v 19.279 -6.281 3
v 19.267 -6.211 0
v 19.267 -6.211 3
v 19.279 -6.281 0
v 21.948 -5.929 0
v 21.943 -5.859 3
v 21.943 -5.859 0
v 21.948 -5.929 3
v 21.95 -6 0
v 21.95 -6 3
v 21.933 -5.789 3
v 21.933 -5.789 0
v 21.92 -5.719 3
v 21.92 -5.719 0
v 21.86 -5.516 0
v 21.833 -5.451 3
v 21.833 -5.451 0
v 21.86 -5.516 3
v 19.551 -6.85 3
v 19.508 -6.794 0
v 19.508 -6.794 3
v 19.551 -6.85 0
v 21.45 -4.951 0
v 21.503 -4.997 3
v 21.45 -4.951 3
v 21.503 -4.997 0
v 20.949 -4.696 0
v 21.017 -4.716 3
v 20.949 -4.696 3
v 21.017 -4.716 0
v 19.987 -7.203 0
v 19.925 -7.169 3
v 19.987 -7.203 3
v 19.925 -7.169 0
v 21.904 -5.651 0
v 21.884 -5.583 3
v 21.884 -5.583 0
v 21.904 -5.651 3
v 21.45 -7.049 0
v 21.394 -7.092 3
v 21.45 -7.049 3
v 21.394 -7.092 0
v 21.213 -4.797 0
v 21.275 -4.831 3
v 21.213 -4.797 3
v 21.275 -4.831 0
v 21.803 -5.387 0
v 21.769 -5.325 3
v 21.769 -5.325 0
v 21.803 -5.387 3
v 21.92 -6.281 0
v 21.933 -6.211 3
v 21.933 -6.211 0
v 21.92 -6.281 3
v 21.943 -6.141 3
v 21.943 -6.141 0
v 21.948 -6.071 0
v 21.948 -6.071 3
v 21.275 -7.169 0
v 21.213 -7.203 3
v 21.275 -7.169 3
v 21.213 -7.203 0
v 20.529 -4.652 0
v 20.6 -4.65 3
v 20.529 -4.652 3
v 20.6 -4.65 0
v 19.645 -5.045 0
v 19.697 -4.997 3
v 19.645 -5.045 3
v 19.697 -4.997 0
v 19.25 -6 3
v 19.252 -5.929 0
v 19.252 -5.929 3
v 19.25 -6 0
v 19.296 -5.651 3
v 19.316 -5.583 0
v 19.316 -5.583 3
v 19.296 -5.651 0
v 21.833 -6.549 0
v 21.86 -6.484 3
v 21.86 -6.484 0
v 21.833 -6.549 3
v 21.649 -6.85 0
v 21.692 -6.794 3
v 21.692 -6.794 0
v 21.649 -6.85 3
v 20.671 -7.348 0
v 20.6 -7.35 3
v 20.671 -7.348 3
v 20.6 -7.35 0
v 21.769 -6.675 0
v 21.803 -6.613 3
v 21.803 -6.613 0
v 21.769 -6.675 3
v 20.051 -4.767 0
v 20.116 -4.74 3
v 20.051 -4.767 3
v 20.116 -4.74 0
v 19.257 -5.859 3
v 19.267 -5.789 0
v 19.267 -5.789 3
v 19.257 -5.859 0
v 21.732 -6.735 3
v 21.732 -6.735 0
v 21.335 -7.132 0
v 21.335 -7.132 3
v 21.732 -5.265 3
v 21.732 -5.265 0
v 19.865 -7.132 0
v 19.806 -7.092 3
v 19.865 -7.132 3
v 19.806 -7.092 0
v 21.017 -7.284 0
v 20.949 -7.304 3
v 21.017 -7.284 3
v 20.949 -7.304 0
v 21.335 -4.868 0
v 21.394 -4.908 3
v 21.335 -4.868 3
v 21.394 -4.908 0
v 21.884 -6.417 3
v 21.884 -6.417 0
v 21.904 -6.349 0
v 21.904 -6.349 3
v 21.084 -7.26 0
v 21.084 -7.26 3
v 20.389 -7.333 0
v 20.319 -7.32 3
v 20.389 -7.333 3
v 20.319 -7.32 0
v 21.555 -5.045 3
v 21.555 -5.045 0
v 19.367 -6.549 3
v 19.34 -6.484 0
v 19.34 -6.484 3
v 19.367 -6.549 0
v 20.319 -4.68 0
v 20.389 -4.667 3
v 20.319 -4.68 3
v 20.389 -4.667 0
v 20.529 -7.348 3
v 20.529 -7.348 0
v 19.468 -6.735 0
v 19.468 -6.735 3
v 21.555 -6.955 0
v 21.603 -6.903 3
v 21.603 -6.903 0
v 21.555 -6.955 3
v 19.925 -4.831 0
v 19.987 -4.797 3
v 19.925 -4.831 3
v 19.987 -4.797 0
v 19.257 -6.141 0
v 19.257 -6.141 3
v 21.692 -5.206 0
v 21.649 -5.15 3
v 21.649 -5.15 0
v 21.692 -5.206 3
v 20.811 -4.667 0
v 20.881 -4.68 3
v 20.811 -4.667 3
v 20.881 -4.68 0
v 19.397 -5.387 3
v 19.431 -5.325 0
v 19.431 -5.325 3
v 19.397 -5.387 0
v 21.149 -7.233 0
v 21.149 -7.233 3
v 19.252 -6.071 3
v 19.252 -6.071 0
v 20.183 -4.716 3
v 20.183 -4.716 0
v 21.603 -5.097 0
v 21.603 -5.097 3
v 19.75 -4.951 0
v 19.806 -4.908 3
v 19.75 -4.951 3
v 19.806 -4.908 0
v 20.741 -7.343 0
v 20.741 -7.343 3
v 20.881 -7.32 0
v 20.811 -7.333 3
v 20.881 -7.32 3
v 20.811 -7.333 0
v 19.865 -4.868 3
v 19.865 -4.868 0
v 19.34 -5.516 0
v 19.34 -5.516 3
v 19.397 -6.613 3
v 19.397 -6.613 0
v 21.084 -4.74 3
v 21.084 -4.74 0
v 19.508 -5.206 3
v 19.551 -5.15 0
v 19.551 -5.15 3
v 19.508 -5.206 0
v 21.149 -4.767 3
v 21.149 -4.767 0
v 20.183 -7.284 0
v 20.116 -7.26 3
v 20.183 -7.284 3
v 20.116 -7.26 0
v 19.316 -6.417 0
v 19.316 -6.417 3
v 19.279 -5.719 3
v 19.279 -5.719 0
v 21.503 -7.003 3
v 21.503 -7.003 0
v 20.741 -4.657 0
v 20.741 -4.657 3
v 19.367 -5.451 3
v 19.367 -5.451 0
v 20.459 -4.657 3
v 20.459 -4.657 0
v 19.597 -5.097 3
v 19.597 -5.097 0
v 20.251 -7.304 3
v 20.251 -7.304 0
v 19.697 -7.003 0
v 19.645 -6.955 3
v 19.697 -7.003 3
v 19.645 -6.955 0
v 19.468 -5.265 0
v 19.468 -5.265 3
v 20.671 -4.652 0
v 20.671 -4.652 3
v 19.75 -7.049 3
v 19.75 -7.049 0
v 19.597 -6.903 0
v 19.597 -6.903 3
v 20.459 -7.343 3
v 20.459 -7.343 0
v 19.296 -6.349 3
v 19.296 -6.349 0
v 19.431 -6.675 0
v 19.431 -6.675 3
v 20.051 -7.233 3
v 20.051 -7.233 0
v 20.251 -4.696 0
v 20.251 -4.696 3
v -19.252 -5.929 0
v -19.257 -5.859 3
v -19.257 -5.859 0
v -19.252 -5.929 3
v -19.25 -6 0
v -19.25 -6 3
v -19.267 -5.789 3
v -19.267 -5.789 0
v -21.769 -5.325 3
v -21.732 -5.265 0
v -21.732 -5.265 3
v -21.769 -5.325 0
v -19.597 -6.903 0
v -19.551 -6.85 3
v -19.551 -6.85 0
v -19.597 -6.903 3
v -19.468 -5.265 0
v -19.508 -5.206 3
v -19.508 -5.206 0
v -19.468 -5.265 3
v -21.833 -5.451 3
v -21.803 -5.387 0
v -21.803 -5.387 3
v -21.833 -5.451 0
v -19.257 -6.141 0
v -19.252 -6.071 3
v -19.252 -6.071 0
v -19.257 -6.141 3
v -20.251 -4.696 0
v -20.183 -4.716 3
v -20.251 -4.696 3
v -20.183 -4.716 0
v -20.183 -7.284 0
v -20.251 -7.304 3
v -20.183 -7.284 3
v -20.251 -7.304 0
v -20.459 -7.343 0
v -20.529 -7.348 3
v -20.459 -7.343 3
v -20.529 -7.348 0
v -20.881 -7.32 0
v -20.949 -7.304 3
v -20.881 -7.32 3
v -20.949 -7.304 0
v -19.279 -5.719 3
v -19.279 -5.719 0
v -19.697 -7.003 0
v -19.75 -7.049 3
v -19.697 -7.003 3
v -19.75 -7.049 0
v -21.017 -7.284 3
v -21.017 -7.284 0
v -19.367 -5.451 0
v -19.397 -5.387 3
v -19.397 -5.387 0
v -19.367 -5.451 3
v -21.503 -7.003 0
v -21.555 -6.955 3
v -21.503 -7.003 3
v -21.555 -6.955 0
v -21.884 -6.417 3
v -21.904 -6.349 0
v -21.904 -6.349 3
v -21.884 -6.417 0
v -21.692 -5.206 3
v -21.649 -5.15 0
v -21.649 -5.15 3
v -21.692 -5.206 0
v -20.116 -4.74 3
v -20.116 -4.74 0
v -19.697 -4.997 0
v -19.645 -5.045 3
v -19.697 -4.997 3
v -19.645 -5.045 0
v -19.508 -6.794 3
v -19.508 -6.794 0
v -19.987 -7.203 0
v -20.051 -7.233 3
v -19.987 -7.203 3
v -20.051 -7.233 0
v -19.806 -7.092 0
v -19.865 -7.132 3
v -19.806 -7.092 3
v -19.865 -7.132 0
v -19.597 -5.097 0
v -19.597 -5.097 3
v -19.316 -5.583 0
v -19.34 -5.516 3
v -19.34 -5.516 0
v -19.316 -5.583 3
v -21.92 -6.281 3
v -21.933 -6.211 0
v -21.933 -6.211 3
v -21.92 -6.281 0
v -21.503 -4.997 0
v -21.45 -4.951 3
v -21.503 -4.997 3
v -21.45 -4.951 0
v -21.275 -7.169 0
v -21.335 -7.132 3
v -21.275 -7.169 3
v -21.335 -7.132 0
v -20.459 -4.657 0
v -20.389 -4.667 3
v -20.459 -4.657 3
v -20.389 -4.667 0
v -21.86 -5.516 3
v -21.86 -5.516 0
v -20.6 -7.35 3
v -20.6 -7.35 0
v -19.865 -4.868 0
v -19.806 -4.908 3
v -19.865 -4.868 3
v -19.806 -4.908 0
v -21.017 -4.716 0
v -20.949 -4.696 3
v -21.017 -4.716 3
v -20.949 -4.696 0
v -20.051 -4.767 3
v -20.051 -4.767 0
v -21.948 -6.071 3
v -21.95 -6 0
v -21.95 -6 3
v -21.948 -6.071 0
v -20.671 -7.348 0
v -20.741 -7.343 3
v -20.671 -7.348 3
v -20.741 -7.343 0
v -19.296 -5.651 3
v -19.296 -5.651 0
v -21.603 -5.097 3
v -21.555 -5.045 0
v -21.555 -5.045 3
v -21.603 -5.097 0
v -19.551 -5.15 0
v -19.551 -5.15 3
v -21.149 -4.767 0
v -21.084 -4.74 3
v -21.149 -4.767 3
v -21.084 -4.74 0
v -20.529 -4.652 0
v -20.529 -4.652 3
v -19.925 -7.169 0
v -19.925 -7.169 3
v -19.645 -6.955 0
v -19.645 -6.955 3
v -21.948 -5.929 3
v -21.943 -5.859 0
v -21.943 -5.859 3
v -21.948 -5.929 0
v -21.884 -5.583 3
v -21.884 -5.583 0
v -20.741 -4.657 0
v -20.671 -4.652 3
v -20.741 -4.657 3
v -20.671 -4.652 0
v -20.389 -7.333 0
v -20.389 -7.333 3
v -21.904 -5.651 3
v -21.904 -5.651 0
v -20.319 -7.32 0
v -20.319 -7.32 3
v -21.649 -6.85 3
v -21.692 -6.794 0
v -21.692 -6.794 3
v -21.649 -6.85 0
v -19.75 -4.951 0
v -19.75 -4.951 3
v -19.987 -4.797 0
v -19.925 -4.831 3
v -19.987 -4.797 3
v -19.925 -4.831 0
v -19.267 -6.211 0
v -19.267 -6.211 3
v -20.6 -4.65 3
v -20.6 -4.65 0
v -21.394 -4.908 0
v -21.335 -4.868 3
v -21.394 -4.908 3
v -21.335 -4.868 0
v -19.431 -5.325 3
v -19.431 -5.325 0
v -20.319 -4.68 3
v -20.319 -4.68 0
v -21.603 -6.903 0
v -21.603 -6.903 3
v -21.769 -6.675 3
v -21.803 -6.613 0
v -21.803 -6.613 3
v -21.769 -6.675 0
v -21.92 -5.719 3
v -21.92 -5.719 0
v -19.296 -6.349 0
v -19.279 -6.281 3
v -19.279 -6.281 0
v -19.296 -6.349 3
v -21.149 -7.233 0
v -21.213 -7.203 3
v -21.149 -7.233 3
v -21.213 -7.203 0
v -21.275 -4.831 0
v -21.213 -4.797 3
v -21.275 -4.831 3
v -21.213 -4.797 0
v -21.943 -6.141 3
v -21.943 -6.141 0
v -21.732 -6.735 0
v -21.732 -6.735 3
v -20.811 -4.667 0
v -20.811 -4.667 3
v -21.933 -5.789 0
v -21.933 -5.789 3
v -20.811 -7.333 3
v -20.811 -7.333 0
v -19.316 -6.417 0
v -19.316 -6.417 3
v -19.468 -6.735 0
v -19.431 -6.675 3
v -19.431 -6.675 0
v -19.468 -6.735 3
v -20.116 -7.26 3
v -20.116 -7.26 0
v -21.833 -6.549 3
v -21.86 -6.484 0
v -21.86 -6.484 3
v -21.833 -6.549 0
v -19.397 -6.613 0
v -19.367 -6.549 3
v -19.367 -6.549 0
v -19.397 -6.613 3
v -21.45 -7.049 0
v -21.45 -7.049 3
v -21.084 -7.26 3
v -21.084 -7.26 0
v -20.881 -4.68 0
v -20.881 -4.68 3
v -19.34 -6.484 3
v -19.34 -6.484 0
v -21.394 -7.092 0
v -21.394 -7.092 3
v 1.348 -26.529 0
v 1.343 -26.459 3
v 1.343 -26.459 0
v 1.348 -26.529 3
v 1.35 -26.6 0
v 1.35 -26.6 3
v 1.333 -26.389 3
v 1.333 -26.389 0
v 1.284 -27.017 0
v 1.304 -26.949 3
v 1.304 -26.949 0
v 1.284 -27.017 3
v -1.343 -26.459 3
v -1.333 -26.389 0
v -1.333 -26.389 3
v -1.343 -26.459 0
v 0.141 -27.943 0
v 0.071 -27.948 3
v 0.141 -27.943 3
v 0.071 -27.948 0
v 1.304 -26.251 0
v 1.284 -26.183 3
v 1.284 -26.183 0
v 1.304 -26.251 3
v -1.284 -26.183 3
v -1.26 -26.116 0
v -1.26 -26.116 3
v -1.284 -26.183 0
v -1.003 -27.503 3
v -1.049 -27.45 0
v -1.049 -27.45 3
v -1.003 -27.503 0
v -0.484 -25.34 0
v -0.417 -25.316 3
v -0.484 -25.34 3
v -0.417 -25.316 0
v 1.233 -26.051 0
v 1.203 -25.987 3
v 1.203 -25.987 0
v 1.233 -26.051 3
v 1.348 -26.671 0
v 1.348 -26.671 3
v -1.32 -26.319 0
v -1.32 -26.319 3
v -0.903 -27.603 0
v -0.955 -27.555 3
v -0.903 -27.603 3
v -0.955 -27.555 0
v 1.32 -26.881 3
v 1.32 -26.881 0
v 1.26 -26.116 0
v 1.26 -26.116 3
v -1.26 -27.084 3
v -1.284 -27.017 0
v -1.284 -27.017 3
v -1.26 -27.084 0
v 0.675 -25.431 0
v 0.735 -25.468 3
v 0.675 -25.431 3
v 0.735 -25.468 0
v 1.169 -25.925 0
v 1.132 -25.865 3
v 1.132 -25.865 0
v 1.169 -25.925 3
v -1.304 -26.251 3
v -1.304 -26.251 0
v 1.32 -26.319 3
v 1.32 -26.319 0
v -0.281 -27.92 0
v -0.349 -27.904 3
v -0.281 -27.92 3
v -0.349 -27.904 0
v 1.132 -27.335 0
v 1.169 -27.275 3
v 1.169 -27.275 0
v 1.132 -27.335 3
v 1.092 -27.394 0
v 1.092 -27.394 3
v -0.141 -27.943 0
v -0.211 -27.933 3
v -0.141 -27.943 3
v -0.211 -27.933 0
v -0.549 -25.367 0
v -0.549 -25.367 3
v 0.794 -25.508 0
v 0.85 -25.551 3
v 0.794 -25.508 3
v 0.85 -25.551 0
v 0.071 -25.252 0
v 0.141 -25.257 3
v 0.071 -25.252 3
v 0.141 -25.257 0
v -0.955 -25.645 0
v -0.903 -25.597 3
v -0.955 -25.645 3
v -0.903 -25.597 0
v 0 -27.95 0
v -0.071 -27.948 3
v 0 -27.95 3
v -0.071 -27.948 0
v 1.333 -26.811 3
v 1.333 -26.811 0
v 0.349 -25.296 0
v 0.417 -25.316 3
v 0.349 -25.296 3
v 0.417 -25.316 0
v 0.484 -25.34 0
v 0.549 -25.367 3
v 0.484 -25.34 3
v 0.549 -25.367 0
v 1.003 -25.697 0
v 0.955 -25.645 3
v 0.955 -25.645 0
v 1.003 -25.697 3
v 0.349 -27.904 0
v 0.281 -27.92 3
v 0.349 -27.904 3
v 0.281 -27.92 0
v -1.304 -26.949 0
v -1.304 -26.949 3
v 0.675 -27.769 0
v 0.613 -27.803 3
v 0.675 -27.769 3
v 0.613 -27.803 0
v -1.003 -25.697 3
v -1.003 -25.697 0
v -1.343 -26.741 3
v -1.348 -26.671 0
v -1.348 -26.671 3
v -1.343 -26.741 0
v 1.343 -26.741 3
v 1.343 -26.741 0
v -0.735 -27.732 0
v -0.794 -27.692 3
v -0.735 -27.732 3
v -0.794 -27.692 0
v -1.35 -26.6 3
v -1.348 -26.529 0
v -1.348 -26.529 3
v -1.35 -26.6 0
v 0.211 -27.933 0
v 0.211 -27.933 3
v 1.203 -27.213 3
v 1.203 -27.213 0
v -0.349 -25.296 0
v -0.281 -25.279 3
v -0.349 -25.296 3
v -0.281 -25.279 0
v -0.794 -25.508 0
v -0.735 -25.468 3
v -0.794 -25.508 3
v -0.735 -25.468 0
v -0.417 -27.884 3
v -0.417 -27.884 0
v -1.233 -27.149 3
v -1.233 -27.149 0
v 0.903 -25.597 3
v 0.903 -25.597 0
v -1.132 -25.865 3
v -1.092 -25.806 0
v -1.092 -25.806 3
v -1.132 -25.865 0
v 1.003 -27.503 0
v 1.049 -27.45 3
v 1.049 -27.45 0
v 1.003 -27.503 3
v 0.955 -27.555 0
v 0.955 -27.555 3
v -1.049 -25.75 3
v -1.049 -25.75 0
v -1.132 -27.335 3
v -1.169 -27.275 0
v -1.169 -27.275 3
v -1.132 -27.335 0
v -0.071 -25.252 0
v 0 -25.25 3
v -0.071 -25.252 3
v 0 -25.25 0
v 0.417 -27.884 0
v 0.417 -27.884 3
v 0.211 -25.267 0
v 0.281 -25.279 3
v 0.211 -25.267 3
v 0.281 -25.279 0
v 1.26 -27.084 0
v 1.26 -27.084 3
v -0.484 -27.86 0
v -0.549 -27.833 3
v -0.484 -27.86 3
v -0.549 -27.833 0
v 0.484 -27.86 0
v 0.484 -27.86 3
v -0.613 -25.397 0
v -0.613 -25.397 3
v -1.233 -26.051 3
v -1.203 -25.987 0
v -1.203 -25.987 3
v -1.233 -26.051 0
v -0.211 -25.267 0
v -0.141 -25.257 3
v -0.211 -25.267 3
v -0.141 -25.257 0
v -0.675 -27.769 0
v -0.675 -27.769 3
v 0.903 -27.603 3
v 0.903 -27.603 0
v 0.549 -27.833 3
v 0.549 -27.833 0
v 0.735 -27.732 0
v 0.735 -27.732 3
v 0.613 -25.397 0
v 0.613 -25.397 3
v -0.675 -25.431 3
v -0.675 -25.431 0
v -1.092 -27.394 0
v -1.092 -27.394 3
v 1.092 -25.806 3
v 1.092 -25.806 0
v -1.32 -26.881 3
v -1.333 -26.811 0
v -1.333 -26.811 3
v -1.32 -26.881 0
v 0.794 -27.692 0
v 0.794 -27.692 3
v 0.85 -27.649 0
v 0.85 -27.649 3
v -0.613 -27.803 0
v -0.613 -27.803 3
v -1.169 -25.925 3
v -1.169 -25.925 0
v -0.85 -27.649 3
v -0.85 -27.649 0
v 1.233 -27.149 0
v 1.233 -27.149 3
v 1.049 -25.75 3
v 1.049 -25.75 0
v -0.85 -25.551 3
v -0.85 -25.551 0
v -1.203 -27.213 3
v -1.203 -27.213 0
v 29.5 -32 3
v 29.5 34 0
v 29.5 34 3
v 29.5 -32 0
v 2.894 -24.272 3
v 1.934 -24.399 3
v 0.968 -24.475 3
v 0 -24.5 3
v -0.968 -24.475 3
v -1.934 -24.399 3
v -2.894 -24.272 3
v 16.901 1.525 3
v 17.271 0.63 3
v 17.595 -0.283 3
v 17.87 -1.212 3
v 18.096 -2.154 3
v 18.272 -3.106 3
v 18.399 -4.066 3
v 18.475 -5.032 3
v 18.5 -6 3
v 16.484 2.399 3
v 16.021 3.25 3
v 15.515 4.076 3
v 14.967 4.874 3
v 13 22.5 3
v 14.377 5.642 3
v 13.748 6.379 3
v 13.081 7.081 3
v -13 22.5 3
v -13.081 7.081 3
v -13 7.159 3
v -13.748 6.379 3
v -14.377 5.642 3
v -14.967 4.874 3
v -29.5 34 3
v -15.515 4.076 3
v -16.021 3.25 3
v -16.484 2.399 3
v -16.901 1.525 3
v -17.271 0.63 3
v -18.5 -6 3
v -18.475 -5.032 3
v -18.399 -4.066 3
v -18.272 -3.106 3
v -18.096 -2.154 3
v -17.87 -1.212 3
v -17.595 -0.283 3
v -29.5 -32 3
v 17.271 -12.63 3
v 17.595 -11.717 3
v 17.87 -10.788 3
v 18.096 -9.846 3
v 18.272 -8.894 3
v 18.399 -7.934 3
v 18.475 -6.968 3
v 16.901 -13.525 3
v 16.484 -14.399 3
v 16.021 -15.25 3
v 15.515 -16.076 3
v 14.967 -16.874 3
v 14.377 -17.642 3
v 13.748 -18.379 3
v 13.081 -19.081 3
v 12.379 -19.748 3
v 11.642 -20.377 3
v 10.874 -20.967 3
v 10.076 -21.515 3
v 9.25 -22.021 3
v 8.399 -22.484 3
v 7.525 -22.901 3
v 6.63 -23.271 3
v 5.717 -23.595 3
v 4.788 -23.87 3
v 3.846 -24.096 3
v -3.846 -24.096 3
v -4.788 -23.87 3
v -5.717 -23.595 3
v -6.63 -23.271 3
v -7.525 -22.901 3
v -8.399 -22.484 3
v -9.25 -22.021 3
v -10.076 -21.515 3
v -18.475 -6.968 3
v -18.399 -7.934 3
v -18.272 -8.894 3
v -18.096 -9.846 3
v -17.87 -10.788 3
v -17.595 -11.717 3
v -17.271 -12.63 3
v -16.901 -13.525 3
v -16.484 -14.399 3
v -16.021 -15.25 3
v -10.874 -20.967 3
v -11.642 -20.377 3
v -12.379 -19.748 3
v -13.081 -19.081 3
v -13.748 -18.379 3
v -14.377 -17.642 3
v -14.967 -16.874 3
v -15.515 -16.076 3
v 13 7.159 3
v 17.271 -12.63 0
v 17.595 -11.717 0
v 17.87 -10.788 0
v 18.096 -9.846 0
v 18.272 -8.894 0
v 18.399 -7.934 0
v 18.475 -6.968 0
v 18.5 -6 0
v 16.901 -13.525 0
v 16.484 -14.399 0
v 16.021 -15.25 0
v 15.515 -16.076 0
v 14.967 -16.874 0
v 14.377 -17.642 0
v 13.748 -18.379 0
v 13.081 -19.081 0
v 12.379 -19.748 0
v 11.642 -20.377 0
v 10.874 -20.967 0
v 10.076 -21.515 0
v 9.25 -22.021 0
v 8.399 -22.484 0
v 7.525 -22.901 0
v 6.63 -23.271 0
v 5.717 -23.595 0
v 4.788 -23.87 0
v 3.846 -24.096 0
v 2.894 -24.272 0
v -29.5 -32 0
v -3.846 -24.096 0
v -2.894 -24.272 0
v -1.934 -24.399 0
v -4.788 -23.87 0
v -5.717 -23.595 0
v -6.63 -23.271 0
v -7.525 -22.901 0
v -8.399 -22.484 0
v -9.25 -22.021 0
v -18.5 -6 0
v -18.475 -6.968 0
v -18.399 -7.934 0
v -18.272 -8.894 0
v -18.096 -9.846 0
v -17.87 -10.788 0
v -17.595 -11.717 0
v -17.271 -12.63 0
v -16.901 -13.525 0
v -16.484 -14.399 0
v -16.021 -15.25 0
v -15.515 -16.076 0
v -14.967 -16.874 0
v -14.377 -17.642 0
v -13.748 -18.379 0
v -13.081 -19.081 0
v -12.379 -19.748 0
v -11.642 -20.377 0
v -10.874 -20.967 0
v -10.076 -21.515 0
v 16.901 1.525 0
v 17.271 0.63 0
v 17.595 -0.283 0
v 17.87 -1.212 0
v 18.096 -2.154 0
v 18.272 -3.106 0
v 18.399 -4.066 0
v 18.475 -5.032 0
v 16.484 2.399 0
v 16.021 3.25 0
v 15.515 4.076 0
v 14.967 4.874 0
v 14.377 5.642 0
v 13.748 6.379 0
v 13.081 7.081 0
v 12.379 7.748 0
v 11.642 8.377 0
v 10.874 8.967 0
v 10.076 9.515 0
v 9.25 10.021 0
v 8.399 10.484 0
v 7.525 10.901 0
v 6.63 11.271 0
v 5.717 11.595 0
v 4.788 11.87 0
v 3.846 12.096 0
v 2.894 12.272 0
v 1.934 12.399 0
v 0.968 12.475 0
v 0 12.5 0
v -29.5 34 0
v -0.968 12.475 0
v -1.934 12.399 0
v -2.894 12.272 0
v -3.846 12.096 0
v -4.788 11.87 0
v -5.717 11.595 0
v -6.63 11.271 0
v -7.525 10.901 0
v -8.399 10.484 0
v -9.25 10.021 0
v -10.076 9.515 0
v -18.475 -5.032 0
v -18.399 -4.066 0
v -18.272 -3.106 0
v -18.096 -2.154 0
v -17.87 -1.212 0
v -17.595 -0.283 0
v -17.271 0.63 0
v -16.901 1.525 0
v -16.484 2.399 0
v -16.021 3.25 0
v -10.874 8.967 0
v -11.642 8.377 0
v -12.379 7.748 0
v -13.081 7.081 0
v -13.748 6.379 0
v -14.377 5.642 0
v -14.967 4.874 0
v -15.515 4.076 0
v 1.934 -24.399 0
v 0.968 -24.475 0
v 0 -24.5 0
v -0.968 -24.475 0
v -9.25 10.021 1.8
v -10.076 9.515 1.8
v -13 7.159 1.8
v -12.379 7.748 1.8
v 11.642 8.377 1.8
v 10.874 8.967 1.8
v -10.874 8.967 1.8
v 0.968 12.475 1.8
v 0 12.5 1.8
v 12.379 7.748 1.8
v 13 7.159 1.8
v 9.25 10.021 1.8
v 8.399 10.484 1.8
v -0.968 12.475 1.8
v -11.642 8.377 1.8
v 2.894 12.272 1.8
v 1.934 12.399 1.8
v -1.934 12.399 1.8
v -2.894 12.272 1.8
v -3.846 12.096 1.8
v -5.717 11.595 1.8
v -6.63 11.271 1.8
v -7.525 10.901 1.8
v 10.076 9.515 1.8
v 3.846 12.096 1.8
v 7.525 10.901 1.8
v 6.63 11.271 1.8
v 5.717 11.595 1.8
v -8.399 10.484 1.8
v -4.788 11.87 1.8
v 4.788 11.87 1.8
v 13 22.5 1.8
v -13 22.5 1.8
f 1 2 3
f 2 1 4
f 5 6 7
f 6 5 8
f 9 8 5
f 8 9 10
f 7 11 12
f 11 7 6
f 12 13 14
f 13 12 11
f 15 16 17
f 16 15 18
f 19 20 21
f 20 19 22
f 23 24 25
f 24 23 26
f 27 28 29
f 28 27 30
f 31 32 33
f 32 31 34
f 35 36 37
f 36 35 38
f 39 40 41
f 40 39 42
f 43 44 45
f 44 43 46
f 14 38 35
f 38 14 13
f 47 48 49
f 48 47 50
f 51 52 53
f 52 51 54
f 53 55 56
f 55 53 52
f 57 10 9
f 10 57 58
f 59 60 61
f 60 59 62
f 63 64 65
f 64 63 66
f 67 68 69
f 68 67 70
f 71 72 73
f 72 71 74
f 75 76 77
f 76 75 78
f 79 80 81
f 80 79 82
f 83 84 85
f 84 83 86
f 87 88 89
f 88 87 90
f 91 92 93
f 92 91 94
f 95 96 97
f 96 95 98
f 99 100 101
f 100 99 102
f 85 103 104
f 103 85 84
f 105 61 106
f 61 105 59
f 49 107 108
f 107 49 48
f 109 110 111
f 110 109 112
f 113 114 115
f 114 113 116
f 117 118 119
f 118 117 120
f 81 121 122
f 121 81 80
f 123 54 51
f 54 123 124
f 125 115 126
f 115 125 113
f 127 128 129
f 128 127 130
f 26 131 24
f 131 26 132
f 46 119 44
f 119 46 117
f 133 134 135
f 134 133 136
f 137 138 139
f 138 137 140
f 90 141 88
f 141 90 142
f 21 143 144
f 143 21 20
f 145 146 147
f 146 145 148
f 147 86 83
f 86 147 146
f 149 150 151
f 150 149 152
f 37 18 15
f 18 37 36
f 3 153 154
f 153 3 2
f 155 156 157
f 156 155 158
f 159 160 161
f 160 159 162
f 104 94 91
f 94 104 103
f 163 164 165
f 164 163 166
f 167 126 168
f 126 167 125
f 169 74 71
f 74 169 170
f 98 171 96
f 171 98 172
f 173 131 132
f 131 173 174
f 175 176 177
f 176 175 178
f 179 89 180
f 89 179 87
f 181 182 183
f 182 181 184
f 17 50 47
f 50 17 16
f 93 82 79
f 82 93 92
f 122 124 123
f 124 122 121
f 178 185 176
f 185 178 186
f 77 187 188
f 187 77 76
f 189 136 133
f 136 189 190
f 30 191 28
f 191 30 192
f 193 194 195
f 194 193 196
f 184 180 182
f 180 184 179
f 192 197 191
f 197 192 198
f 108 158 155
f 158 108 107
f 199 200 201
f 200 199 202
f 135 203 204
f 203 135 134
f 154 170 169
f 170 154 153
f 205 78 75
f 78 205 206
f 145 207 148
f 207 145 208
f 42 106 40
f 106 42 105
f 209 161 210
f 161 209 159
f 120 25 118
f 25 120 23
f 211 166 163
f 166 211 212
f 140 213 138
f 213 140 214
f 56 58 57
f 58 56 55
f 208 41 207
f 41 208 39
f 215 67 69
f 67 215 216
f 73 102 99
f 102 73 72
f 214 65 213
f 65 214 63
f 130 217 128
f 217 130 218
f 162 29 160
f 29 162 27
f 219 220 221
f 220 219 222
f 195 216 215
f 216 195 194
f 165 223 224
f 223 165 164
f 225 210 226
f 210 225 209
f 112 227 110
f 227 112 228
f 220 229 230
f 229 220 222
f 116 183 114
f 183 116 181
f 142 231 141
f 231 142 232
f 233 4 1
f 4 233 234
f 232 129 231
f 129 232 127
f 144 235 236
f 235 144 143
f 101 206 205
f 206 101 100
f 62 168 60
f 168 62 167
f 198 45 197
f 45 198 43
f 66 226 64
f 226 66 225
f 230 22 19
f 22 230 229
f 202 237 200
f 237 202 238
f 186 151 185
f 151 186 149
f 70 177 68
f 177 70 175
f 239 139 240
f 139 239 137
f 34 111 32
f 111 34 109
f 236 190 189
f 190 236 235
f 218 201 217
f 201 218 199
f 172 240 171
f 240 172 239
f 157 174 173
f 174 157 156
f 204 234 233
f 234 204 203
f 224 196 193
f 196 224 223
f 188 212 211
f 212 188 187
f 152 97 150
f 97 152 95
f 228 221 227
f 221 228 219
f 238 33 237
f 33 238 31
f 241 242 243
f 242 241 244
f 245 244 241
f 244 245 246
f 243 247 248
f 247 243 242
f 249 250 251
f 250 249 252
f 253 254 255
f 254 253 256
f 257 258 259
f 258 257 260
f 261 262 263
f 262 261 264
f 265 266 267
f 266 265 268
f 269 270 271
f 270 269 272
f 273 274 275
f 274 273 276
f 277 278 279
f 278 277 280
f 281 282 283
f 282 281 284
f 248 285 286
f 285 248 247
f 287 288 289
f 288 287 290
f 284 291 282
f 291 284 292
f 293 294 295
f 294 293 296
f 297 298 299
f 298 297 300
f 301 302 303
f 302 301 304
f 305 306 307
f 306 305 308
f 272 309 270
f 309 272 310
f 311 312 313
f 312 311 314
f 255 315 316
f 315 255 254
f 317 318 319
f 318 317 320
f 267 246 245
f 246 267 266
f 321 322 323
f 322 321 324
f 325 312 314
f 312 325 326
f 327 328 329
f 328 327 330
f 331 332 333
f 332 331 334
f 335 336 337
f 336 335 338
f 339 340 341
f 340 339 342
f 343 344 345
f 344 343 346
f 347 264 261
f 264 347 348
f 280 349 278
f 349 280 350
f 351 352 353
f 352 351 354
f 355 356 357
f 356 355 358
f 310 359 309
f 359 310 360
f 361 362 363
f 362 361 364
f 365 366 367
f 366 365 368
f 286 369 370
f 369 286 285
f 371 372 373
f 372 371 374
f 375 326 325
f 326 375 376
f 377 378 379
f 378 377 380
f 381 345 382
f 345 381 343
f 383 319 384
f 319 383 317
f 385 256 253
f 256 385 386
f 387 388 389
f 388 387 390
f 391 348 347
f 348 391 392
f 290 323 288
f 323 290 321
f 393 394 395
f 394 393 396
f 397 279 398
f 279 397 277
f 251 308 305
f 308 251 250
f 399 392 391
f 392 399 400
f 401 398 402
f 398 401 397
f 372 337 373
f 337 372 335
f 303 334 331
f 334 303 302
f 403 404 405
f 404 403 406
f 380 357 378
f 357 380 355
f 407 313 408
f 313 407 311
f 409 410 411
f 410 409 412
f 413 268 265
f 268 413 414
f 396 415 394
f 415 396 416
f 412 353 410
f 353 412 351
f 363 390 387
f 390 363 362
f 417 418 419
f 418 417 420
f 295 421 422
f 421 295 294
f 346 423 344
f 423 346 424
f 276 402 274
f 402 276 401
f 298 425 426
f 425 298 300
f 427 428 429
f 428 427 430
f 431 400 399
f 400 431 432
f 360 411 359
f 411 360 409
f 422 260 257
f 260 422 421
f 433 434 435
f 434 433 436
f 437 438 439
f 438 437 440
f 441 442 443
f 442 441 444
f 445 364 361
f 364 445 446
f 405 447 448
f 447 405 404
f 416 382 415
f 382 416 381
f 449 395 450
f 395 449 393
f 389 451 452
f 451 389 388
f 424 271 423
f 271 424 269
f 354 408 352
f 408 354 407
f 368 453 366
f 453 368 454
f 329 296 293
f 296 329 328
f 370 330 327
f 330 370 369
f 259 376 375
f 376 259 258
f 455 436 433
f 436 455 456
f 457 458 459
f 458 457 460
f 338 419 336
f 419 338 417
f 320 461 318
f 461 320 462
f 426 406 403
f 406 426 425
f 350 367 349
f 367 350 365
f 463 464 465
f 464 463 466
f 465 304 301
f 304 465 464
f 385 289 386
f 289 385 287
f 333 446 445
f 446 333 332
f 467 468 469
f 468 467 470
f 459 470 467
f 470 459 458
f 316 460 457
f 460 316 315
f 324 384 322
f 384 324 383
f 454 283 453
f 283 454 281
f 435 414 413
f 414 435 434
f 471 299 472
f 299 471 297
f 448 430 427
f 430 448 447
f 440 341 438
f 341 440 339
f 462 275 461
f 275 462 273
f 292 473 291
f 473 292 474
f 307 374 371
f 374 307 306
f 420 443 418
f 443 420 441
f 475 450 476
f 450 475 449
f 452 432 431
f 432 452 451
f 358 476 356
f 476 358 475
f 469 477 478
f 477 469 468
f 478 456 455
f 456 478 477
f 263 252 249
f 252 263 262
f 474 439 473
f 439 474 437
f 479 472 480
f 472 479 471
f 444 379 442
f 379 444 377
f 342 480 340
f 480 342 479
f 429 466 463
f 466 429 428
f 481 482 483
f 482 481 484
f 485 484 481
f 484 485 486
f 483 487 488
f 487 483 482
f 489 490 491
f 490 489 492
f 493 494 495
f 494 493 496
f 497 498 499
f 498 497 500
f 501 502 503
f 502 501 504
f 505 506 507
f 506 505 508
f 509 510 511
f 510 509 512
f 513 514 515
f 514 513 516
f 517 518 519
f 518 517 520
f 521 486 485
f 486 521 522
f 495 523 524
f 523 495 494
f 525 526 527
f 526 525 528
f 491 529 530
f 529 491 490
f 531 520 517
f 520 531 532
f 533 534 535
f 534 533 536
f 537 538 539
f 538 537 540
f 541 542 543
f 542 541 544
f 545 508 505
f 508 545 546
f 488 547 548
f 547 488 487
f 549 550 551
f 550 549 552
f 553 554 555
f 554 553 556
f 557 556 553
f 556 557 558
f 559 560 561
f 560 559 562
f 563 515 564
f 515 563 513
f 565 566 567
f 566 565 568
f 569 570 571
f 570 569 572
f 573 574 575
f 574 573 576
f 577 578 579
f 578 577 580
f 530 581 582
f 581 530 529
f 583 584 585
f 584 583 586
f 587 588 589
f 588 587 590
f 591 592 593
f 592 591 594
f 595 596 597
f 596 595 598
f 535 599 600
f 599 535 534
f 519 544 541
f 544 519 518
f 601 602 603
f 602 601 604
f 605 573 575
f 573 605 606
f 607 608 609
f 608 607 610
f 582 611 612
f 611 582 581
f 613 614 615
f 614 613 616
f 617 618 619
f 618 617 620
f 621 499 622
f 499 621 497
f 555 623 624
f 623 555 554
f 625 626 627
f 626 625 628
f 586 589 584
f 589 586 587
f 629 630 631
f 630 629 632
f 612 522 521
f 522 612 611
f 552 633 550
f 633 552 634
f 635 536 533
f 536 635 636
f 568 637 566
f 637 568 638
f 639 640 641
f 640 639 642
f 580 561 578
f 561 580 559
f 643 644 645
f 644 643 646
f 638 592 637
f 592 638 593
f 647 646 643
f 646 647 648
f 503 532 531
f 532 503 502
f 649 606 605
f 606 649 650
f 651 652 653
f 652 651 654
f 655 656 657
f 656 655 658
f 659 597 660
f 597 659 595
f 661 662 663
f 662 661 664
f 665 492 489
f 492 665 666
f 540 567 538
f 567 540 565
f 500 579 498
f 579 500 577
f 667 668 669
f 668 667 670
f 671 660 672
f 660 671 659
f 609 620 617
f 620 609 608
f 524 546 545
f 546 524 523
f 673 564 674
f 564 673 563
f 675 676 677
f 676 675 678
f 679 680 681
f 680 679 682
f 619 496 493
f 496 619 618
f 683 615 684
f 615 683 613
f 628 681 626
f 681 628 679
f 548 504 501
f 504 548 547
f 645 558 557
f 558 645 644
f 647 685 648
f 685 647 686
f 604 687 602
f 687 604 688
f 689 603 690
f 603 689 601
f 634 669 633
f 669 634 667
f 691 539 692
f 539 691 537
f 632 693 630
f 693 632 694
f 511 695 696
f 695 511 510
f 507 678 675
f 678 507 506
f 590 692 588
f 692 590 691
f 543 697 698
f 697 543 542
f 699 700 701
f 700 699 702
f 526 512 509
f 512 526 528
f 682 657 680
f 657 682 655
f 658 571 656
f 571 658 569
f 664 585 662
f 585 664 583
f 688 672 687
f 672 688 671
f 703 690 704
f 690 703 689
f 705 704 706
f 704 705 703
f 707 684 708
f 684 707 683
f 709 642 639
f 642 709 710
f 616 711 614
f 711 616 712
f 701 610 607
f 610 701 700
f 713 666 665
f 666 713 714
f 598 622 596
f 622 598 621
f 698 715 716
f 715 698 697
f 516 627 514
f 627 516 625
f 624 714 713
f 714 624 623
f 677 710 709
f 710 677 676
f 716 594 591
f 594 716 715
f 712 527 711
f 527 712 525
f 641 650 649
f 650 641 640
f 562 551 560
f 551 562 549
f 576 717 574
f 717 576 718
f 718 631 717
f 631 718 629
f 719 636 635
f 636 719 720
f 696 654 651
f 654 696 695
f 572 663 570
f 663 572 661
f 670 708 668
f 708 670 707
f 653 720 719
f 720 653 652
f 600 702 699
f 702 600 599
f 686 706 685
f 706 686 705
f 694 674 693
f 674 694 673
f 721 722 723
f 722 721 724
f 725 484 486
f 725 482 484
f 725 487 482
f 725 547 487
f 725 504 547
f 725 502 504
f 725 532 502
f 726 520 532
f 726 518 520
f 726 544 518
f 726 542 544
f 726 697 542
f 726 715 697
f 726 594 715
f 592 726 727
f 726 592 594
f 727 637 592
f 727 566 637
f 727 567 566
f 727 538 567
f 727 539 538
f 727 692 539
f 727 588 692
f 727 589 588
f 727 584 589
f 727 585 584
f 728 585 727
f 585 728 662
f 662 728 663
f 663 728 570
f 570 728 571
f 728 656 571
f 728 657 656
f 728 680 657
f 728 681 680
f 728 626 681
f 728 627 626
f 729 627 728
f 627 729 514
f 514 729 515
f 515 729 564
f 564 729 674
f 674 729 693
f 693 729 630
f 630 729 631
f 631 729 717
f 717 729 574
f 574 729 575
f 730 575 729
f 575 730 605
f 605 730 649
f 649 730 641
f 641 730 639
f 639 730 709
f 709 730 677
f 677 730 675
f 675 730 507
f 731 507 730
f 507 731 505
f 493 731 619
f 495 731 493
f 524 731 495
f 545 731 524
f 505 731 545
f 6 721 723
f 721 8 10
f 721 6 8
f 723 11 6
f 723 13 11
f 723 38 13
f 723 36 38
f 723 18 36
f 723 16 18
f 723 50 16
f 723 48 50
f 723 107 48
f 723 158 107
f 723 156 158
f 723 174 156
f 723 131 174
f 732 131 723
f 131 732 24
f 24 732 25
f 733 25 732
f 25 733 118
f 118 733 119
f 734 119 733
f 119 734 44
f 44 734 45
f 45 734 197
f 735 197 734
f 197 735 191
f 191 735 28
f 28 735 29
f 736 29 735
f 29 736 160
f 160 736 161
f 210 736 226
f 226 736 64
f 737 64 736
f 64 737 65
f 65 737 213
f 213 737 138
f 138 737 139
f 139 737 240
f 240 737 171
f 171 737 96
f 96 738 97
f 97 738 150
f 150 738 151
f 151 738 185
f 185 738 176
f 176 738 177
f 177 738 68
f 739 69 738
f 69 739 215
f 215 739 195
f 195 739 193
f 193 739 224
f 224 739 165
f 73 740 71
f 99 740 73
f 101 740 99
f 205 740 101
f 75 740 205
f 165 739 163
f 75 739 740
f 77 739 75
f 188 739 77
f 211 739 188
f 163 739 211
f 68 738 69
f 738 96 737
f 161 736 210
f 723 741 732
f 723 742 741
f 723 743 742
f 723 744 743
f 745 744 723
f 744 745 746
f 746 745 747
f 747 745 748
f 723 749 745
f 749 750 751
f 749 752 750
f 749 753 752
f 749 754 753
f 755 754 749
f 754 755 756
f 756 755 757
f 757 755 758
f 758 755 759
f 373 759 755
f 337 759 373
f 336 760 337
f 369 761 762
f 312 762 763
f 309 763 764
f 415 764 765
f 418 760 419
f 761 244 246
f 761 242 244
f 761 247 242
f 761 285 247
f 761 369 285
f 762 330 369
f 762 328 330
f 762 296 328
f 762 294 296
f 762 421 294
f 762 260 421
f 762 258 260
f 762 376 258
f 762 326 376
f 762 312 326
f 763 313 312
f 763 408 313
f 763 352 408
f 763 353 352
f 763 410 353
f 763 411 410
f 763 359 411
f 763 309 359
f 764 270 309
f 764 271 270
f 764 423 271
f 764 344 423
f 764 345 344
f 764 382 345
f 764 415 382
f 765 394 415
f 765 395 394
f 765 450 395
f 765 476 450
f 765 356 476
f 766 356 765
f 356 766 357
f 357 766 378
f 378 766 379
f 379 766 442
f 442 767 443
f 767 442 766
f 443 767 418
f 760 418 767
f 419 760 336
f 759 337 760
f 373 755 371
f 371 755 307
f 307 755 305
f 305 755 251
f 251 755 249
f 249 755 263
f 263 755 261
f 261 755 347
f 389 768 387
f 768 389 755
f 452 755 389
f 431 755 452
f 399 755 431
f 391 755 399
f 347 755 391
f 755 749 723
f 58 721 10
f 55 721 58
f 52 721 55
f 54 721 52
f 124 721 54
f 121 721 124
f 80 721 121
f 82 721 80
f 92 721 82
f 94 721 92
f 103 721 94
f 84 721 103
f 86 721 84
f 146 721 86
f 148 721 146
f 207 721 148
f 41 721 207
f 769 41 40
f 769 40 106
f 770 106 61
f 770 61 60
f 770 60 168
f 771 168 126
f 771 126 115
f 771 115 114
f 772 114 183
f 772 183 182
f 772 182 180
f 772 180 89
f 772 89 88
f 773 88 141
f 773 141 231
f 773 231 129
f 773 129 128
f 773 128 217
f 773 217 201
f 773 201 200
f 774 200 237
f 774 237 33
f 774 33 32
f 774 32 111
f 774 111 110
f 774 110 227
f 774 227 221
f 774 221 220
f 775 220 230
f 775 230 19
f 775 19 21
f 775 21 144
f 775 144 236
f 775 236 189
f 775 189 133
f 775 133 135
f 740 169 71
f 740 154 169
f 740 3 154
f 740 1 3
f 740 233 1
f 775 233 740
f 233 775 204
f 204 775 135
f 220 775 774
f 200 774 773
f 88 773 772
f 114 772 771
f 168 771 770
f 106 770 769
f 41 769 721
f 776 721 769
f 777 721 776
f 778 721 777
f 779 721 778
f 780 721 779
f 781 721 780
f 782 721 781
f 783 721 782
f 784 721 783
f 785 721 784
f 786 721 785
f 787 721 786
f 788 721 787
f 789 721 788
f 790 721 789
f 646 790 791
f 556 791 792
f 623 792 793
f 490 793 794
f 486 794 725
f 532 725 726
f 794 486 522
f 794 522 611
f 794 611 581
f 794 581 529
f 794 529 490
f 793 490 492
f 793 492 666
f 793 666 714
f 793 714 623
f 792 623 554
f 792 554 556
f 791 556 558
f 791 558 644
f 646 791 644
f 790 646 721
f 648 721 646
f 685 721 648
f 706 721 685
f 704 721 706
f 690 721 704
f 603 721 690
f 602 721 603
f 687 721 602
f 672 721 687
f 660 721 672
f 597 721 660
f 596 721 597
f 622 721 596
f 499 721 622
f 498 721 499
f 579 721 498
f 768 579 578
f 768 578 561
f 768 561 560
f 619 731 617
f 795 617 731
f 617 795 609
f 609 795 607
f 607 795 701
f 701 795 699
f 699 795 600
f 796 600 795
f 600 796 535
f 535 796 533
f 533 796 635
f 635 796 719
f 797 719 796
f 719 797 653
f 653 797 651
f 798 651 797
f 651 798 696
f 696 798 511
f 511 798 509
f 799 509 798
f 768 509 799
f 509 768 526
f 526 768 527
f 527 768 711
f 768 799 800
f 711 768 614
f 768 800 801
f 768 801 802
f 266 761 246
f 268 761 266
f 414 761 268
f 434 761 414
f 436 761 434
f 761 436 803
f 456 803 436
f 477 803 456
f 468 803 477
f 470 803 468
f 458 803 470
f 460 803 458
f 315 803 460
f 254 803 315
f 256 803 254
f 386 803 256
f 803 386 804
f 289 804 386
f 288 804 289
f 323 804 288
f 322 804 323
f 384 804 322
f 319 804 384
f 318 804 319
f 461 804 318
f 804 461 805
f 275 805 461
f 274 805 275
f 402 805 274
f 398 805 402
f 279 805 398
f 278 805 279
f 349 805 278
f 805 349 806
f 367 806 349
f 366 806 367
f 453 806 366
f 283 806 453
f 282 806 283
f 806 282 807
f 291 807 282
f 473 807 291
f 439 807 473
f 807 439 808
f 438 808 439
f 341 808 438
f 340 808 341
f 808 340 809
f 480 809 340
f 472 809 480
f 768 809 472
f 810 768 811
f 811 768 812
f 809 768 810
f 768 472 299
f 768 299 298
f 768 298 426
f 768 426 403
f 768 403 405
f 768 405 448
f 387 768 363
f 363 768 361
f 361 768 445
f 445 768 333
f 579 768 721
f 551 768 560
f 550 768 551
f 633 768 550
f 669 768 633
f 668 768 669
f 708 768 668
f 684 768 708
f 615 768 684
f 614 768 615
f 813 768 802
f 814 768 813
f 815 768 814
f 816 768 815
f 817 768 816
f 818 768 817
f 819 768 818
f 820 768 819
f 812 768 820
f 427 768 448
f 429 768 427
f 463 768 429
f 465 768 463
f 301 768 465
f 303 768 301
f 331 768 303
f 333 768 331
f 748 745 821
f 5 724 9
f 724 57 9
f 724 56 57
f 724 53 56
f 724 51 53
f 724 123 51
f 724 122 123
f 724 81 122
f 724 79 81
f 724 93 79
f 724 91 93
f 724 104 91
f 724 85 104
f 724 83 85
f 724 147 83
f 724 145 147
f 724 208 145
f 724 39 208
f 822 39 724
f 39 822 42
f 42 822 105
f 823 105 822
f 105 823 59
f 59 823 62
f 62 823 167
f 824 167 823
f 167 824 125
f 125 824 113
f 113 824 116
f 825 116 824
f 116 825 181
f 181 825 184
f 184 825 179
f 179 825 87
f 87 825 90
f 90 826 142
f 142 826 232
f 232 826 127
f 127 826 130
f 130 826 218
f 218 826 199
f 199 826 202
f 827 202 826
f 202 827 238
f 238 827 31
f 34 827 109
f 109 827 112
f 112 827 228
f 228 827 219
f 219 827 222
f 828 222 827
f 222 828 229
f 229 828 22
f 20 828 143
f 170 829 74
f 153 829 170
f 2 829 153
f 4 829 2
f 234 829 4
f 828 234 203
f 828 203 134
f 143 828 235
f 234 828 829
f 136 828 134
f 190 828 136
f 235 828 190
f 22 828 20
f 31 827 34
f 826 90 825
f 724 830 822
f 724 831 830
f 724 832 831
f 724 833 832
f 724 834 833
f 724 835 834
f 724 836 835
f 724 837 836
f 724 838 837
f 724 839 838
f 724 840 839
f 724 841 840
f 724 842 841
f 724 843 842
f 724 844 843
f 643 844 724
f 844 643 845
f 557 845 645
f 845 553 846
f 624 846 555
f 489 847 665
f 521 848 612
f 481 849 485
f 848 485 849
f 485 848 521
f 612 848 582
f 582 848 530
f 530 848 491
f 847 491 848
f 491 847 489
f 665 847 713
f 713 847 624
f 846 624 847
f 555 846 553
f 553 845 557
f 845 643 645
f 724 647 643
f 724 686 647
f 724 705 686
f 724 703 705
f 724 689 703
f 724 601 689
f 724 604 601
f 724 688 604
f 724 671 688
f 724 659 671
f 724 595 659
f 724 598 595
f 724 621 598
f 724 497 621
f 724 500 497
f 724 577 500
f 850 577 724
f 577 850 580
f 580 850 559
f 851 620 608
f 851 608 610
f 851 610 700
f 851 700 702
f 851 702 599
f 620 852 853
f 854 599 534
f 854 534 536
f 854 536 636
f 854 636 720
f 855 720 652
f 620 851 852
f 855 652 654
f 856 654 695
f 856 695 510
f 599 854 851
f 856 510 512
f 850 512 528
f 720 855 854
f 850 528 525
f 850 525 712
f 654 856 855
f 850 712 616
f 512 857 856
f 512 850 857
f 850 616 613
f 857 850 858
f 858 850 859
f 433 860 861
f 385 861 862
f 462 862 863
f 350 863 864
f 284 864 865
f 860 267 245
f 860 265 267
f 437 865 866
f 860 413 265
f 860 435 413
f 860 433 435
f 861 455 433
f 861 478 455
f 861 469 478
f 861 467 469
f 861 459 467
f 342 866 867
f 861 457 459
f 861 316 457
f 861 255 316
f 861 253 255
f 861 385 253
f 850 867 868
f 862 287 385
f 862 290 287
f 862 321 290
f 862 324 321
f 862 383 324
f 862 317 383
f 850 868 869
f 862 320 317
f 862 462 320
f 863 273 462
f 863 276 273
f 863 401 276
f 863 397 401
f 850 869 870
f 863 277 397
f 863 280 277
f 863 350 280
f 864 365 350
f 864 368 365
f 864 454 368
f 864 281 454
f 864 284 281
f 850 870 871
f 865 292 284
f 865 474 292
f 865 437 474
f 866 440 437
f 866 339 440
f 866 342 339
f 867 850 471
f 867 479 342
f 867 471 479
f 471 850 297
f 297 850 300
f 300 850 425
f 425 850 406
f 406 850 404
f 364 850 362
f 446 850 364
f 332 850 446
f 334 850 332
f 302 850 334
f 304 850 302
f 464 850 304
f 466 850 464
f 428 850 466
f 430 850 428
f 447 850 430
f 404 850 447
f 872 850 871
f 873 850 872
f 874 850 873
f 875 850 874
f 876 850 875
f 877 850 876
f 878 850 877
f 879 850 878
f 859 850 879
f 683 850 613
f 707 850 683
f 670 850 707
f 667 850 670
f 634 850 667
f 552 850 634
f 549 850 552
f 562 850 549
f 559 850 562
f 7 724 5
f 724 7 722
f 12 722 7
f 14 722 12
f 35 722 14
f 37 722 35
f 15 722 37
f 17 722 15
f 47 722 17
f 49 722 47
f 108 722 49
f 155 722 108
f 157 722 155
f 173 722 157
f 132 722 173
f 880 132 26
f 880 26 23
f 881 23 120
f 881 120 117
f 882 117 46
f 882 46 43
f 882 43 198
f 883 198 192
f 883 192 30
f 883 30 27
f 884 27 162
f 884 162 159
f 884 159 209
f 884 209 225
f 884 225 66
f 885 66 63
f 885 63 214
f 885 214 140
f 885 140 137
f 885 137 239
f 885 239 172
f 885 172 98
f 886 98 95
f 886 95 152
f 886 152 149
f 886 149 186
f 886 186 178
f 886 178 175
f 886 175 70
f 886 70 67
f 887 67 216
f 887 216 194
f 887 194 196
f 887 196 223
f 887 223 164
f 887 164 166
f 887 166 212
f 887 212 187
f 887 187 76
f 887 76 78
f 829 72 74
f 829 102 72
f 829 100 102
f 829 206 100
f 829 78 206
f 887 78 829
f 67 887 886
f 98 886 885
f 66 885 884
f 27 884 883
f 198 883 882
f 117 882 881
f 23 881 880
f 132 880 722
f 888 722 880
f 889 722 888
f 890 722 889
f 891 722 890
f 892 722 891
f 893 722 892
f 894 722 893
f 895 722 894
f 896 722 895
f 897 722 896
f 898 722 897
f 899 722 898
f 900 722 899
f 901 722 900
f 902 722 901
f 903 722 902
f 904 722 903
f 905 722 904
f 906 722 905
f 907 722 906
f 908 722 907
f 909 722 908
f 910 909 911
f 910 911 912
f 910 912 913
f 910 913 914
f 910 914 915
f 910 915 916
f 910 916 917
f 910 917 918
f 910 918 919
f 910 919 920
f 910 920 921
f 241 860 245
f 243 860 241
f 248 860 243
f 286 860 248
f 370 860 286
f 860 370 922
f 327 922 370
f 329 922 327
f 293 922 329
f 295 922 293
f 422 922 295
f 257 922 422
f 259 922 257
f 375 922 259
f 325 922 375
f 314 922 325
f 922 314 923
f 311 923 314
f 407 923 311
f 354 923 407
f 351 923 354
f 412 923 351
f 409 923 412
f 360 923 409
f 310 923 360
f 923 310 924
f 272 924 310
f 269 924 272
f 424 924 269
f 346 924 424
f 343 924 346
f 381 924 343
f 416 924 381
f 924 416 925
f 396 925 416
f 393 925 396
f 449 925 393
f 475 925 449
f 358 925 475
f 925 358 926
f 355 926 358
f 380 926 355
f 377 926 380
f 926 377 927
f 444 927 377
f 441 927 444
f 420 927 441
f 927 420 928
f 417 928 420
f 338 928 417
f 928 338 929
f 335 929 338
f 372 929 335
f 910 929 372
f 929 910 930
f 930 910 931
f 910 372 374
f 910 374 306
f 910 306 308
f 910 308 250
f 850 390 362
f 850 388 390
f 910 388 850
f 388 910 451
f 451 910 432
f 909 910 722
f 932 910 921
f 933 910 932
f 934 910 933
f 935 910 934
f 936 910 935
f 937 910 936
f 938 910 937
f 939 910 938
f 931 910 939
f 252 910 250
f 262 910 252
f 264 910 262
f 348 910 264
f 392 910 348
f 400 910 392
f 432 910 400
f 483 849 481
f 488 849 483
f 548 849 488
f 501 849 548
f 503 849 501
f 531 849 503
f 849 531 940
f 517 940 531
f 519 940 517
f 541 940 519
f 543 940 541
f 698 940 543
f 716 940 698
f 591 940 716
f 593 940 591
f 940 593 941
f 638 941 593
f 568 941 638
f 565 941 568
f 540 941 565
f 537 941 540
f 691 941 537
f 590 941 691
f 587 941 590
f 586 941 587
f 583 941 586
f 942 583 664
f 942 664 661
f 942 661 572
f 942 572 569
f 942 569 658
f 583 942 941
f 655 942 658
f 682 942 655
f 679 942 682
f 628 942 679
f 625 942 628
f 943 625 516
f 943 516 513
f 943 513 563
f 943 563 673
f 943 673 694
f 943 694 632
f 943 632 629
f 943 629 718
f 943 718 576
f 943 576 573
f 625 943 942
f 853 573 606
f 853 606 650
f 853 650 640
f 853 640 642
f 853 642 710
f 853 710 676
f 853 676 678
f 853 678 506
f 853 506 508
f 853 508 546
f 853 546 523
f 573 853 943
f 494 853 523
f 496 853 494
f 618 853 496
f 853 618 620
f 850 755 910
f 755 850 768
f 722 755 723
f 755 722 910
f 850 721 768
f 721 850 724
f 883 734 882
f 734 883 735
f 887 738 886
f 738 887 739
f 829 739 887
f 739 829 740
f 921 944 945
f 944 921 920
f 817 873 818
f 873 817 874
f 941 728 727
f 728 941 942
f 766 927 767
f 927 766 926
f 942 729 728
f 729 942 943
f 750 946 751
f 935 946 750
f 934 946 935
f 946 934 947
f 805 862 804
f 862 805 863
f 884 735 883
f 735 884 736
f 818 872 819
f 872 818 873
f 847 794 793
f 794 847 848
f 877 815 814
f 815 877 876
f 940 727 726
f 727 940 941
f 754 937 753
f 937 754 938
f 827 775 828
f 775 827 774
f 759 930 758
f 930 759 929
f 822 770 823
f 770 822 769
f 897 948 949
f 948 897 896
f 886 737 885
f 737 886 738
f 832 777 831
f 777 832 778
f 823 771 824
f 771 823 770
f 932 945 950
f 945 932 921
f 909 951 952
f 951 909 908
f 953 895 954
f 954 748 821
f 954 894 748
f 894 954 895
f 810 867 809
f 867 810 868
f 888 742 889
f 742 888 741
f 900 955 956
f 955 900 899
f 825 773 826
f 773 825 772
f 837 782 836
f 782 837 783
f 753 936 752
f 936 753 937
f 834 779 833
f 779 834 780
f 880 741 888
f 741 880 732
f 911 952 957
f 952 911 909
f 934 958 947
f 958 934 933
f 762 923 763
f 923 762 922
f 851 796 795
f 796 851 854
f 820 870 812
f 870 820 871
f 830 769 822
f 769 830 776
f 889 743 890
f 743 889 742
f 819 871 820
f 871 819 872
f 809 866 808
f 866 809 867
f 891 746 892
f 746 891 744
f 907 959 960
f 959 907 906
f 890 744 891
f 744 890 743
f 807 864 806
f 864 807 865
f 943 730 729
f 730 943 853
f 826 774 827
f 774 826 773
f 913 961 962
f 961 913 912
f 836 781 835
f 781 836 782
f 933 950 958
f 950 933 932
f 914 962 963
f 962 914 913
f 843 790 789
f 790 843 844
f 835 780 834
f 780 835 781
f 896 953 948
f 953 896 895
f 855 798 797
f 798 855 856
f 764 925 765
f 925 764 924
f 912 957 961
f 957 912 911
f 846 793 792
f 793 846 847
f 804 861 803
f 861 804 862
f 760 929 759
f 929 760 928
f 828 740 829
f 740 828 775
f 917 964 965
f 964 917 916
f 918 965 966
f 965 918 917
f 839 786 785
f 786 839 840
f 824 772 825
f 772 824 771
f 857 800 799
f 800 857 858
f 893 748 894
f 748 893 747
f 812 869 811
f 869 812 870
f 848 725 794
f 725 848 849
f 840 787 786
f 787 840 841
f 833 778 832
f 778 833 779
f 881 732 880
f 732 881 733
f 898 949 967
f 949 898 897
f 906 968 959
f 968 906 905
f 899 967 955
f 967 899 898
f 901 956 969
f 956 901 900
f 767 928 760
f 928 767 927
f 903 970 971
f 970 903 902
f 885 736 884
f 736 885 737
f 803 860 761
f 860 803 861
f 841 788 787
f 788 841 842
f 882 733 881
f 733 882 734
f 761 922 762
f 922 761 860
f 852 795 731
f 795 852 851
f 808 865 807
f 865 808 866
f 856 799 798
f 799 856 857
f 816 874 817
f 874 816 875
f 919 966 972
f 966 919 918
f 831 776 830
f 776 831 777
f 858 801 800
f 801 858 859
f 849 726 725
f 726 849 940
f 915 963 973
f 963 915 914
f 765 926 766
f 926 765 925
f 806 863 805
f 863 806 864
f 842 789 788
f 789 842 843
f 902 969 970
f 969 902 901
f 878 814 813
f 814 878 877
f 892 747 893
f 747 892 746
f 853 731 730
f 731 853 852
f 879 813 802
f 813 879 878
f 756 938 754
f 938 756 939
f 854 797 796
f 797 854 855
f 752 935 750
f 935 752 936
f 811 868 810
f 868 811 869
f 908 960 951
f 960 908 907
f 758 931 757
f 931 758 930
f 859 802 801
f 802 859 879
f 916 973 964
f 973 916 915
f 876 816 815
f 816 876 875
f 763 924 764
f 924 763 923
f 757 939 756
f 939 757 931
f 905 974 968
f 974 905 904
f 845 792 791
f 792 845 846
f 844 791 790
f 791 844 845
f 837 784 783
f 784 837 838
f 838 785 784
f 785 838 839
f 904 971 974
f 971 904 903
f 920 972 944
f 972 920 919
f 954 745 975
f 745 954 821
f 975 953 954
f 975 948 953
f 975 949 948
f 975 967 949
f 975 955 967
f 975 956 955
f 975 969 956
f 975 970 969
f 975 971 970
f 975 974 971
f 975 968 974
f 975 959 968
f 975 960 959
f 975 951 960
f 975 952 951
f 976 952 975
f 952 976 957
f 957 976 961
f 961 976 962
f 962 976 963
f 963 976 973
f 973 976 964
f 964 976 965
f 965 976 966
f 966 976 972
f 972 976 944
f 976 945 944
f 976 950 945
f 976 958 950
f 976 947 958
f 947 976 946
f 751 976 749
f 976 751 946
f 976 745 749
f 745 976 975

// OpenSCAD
// Prototype 10: matching coupon and silver bezel. Units mm.
// Select part="coupon" or part="bezel".
part="coupon";
$fn=120;
aperture=37.0;
bezel_outer=45.0;
bezel_inner=37.4;
pin_circle=20.6;
pin_d=2.4;
pin_length=3.8;
hole_d=2.7;
angles=[0,180,270]; // pins avoid upper rectangular connector PCB
panel_thickness=3;
module pins(){for(a=angles) translate([pin_circle*cos(a),pin_circle*sin(a),0]) children();}
module coupon(){difference(){
 translate([-29.5,-32,0]) cube([59,66,panel_thickness]);
 translate([0,-6,-0.2]) cylinder(d=aperture,h=panel_thickness+0.4);
 // Rear connector relief retained from P09, aligned to display center y=-6.
 translate([-13,4,panel_thickness-1.2]) cube([26,18.5,1.4]);
 translate([0,-6,0]) pins() translate([0,0,-0.2]) cylinder(d=hole_d,h=panel_thickness+0.4);
}}
module bezel(){union(){
 difference(){cylinder(d=bezel_outer,h=1.4);translate([0,0,-0.1])cylinder(d=bezel_inner,h=1.6);}
 translate([0,0,1.4]) pins() cylinder(d=pin_d,h=pin_length);
}}
if(part=="coupon") coupon();
if(part=="bezel") bezel();
